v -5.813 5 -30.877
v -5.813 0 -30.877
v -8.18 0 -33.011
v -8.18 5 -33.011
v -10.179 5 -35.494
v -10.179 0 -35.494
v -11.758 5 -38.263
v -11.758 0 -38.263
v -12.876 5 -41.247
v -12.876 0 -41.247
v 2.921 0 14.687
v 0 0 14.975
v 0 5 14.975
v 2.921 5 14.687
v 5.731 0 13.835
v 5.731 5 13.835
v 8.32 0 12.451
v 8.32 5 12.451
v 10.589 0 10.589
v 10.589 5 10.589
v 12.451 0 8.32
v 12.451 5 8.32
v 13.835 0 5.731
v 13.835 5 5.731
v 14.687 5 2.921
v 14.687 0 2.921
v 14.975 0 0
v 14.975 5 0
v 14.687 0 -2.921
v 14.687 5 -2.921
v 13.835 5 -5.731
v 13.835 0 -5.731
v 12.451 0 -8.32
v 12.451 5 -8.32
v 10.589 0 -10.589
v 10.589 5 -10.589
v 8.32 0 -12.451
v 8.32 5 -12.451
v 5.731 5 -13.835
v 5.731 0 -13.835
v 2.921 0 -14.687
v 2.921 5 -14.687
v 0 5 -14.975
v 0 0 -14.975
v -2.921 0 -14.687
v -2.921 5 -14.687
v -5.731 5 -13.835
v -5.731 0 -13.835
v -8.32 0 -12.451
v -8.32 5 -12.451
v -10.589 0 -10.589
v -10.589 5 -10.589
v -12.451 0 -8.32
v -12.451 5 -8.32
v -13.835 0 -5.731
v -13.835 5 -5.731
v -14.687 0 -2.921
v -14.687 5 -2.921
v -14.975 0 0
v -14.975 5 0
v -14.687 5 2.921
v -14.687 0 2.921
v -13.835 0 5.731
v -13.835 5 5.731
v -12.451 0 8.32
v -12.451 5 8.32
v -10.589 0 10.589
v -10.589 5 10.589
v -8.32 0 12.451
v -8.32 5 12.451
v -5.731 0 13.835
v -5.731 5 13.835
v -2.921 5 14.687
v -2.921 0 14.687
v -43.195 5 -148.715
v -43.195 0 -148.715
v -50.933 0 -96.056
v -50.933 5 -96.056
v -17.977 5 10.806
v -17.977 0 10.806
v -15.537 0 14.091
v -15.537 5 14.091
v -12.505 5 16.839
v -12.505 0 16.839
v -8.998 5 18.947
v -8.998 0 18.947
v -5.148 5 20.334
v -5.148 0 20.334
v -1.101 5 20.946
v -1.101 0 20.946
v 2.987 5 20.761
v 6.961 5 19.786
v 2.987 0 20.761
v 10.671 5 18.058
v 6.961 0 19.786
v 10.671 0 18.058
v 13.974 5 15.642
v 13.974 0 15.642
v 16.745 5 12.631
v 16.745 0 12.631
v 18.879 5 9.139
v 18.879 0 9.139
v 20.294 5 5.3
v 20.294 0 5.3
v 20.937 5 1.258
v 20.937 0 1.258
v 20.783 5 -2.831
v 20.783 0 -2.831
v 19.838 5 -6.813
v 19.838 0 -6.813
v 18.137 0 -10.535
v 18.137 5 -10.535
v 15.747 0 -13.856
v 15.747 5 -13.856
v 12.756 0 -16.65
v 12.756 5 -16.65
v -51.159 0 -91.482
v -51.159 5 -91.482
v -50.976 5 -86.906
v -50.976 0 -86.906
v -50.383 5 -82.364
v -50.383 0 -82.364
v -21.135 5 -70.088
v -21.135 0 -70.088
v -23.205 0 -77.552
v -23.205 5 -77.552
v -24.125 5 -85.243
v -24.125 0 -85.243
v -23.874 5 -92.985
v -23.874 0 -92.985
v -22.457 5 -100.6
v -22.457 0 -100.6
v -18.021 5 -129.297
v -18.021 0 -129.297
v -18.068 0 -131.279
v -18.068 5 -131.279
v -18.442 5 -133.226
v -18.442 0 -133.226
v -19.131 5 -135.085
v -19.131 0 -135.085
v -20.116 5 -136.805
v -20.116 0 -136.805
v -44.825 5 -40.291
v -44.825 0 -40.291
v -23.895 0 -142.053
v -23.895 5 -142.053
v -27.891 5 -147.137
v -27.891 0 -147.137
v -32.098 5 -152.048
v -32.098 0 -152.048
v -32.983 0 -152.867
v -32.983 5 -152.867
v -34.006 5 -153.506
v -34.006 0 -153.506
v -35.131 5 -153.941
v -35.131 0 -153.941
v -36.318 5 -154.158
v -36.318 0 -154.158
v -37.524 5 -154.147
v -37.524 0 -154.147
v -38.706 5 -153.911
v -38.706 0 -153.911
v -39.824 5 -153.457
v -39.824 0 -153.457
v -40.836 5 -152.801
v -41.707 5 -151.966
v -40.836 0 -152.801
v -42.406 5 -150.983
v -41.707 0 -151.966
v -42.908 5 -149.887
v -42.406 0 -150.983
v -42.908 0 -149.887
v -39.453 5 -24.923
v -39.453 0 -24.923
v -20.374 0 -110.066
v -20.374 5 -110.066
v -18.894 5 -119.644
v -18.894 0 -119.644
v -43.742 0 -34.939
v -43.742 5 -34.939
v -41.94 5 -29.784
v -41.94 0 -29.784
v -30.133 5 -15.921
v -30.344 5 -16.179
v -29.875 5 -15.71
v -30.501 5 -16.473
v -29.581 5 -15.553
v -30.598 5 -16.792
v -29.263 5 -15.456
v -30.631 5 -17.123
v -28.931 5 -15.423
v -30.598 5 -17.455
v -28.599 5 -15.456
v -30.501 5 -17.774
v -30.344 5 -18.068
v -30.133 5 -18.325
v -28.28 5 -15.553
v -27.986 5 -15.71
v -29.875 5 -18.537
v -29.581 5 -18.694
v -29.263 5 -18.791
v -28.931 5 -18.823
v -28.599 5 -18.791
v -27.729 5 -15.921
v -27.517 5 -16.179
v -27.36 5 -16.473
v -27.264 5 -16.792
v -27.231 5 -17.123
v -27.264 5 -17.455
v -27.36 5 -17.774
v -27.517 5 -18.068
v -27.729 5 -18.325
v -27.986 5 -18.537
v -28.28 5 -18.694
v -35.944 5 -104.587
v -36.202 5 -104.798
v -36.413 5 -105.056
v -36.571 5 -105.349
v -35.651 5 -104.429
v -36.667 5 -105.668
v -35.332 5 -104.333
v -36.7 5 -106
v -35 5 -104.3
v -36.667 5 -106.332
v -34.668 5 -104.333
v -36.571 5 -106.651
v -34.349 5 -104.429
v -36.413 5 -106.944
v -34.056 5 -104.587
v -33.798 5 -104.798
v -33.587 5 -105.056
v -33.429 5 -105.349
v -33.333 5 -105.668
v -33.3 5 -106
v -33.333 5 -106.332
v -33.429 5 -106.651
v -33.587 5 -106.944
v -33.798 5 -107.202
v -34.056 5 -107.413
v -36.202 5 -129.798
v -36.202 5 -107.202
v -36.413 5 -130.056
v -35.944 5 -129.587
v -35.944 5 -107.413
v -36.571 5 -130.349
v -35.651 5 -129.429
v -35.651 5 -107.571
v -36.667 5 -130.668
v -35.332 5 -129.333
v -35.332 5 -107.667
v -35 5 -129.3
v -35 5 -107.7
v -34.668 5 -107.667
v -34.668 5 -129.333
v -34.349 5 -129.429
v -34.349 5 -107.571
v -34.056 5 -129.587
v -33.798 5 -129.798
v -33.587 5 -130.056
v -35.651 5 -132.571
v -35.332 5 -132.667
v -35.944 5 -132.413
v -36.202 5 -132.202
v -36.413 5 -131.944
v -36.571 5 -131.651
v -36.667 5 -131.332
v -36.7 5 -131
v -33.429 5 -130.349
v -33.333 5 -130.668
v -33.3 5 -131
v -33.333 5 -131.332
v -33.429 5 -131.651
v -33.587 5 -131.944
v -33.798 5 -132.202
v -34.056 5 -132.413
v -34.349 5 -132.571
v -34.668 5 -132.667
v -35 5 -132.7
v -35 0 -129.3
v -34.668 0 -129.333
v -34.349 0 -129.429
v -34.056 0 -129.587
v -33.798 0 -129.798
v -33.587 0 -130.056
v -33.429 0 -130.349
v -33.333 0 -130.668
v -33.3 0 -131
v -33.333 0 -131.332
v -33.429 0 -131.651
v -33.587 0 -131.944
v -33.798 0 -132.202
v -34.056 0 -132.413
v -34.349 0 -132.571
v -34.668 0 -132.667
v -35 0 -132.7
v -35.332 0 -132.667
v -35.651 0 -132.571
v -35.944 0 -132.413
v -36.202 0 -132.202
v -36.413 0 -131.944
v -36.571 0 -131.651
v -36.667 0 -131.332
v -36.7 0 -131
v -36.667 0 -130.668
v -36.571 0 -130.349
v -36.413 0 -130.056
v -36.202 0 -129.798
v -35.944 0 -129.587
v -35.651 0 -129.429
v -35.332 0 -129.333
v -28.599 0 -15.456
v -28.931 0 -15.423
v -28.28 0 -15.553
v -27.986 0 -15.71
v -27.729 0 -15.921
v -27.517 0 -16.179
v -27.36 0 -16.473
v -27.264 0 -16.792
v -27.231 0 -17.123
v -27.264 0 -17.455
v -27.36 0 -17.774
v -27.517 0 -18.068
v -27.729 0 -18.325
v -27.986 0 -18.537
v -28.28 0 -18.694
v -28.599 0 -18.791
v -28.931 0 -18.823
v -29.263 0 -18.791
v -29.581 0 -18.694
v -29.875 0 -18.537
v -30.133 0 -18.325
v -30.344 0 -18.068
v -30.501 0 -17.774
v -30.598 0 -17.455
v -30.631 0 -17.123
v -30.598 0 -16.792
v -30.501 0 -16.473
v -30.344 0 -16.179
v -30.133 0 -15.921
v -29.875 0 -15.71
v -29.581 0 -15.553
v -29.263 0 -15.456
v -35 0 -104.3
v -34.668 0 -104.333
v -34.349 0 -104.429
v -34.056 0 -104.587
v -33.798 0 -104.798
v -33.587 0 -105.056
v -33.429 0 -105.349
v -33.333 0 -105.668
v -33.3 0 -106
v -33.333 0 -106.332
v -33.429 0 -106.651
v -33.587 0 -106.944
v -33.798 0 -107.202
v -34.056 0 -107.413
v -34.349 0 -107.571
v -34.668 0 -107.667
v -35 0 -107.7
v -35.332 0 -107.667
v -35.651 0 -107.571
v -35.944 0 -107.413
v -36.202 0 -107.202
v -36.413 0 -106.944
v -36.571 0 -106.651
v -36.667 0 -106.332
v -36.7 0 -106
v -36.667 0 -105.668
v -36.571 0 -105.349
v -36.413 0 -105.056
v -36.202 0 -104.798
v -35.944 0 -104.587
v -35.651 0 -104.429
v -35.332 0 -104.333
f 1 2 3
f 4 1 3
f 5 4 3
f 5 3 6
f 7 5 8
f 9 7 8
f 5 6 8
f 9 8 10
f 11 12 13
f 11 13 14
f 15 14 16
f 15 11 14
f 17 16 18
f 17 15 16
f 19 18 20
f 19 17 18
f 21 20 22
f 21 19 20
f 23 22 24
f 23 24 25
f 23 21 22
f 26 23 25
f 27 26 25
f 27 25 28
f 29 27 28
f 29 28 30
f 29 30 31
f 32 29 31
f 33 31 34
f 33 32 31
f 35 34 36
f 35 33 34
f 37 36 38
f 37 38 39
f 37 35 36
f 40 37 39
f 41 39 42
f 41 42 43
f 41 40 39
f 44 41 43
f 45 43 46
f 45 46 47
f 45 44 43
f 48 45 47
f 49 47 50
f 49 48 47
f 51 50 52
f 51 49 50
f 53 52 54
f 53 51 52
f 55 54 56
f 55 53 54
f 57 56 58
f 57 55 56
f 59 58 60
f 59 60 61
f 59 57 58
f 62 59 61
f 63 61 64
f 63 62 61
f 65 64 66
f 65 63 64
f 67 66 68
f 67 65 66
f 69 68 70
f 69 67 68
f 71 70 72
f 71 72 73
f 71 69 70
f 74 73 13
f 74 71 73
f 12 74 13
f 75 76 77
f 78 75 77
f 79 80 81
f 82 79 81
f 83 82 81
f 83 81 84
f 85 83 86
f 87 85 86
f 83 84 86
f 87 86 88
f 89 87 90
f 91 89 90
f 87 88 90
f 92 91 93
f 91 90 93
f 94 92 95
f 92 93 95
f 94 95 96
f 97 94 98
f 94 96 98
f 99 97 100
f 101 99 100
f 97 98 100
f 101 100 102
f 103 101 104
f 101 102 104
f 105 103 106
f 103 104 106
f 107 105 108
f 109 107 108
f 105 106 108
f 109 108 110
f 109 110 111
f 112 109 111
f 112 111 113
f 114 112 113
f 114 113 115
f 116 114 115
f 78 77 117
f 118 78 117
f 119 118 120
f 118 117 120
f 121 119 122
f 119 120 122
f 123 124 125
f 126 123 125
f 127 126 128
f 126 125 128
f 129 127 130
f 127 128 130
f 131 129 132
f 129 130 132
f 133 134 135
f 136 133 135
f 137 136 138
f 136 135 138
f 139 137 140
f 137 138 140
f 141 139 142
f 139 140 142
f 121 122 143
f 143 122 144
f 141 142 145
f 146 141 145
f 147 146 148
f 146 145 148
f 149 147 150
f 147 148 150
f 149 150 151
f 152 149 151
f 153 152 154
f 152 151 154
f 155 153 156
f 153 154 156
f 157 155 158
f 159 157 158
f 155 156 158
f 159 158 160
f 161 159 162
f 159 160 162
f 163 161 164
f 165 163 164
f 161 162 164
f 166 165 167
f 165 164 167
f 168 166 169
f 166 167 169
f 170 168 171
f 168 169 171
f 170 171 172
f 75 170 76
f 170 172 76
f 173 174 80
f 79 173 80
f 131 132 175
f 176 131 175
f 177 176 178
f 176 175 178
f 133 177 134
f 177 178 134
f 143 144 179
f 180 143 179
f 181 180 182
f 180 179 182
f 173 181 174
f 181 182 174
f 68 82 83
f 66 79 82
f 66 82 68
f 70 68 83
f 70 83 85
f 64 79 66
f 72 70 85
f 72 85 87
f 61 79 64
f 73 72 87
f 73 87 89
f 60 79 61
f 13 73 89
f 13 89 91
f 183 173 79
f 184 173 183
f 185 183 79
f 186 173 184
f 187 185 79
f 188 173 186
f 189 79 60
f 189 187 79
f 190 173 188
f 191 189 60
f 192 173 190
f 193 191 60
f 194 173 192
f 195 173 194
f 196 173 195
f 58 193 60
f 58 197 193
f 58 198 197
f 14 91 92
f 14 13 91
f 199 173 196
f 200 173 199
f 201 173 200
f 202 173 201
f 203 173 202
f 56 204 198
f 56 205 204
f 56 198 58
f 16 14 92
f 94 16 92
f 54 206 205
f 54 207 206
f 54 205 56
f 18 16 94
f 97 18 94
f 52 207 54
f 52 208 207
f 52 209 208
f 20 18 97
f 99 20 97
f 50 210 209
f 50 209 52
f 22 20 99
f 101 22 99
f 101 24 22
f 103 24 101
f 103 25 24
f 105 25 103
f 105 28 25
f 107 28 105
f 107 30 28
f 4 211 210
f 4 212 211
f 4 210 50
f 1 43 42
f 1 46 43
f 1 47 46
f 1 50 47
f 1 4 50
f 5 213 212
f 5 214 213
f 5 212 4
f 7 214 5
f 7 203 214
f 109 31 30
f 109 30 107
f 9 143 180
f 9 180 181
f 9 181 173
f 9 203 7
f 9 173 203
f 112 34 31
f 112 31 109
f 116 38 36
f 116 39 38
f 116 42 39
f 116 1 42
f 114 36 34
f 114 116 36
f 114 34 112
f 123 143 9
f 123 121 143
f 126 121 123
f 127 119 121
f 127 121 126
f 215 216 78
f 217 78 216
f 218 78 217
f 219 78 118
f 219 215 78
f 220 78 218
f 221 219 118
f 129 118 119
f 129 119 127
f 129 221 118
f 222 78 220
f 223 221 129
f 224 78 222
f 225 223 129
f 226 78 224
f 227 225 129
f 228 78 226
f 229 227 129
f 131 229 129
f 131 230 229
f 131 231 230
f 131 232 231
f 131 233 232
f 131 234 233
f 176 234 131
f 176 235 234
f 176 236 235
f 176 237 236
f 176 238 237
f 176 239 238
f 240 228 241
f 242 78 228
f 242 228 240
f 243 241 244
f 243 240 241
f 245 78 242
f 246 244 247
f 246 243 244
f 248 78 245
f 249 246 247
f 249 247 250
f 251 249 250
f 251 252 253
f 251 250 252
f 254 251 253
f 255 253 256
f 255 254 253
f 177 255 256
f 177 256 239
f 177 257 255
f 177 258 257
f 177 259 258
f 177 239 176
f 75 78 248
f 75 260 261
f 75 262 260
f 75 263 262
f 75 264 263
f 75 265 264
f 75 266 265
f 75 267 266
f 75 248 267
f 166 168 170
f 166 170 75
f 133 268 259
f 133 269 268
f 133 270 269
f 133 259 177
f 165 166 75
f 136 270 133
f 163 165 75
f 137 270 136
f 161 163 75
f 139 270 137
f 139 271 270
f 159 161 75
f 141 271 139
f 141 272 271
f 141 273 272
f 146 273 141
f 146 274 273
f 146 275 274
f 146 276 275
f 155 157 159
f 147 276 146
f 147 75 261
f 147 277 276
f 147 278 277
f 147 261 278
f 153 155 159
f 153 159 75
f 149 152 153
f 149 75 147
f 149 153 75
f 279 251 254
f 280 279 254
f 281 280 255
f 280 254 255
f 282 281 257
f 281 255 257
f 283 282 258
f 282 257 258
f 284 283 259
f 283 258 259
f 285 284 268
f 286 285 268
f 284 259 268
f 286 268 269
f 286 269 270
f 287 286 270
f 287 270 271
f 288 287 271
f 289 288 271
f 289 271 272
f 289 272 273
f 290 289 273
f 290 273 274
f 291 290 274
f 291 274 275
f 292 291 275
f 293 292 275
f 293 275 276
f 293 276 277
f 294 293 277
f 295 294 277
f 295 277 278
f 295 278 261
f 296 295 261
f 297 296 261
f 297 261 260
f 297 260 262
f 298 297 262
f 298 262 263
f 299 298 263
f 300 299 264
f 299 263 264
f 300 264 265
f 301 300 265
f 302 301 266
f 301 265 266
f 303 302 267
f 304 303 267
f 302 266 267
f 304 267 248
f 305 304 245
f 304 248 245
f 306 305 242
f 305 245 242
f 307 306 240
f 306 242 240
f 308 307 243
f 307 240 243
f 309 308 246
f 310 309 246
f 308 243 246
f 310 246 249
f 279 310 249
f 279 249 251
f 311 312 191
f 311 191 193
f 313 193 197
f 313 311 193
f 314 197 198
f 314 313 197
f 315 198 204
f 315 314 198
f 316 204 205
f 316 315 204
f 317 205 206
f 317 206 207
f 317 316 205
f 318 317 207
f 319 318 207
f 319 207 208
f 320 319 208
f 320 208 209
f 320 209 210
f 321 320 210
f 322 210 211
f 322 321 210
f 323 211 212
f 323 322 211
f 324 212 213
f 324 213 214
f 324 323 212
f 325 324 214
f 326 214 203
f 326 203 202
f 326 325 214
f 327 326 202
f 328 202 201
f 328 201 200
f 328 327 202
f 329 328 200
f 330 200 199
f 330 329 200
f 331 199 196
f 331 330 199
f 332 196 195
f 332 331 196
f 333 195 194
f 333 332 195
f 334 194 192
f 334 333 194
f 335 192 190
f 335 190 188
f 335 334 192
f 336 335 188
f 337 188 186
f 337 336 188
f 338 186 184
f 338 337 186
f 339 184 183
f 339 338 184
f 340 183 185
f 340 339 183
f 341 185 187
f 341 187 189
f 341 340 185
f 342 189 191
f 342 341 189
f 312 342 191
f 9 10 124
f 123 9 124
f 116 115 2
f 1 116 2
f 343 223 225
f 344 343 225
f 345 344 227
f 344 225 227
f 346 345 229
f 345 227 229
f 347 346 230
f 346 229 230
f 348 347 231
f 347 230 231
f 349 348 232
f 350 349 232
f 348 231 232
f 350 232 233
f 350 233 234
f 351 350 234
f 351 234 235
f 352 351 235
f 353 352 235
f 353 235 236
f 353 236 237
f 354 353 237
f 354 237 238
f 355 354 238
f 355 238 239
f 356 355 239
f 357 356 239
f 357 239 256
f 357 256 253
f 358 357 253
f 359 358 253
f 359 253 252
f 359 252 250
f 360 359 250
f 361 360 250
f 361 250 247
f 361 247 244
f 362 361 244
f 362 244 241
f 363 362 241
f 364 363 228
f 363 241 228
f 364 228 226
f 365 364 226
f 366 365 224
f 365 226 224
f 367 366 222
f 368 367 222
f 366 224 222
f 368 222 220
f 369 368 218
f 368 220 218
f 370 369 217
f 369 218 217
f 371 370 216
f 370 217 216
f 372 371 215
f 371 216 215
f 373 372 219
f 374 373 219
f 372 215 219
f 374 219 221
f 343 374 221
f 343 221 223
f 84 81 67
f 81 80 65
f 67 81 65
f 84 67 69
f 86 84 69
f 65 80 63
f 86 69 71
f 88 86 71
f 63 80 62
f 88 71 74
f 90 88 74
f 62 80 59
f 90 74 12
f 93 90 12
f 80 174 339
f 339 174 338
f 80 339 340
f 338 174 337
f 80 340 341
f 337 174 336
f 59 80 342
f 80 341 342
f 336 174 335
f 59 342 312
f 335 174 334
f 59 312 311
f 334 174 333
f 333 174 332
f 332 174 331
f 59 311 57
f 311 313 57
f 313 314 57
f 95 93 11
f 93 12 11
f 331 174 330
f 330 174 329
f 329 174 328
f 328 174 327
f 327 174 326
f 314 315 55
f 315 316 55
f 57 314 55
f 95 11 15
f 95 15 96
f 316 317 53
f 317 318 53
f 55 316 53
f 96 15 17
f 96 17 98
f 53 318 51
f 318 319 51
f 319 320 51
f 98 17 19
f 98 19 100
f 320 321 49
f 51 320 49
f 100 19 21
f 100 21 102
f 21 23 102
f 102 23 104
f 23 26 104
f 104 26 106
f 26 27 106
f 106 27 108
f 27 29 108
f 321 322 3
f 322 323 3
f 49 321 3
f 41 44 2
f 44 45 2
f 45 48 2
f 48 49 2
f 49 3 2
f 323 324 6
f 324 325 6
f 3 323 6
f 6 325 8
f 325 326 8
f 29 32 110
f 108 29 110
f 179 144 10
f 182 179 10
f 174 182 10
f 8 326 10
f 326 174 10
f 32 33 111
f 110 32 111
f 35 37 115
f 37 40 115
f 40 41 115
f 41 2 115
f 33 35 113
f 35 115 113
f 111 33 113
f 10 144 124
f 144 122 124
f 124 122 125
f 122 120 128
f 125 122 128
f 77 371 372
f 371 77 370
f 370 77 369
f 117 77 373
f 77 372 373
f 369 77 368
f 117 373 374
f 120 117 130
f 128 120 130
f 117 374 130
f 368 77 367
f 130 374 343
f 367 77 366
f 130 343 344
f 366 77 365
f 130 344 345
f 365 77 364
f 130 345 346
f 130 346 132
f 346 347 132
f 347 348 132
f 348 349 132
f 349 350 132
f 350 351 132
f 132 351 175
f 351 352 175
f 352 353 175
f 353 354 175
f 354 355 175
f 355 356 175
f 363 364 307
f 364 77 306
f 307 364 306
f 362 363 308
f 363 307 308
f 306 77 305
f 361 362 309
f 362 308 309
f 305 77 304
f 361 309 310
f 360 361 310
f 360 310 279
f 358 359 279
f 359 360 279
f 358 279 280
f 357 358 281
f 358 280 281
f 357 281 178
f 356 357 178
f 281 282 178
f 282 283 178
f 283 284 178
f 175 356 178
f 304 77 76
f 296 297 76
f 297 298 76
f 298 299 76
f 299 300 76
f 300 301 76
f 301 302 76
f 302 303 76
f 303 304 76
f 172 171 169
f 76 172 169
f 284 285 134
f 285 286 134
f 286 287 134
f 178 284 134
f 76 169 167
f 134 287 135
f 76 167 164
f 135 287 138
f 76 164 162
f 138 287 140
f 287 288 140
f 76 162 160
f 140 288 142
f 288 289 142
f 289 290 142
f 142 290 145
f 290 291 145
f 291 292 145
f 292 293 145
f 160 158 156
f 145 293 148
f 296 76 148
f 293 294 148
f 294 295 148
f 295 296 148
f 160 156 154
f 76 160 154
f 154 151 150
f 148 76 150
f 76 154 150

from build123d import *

# Parameters (mm, degrees)
SKETCH1_R           = 14.975
SKETCH1_R_2         = 1.7
BOSS_EXTRUDE2_DEPTH = 5
CUT_EXTRUDE1_REACH  = 164.524
SKETCH3_R           = 1.7


with BuildPart() as part:
    # Sketch1 → Boss-Extrude2 (new body)
    with BuildSketch(Plane(origin=(0, 0, 0), x_dir=(1, 0, 0), z_dir=(0, 1, 0))):
        with BuildLine():
            Line((12.756485957, 16.650005737), (-5.812603326, 30.876807241))
            ThreePointArc((-5.812603326, 30.876807241), (-10.178871966, 35.493803021), (-12.876419651, 41.247426954))
            Line((-12.876419651, 41.247426954), (-21.13456265, 70.088423369))
            ThreePointArc((-21.13456265, 70.088423369), (-24.125041887, 85.243134658), (-22.456551163, 100.599709115))
            ThreePointArc((-22.456551163, 100.599709115), (-19.558480324, 114.843106453), (-18.020623668, 129.29676271))
            ThreePointArc((-18.020623668, 129.29676271), (-18.441772746, 133.226047543), (-20.116399197, 136.805470974))
            ThreePointArc((-20.116399197, 136.805470974), (-25.866377757, 144.615905974), (-32.098124488, 152.047627243))
            ThreePointArc((-32.098124488, 152.047627243), (-38.706331156, 153.910886754), (-43.194615771, 148.715173848))
            Line((-43.194615771, 148.715173848), (-50.932711484, 96.056215067))
            ThreePointArc((-50.932711484, 96.056215067), (-51.118515181, 89.191813761), (-50.383474997, 82.364351257))
            Line((-50.383474997, 82.364351257), (-44.824720745, 40.290812443))
            ThreePointArc((-44.824720745, 40.290812443), (-42.928869469, 32.33094735), (-39.452930017, 24.92341407))
            Line((-39.452930017, 24.92341407), (-17.977463078, -10.80562105))
            ThreePointArc((-17.977463078, -10.80562105), (13.973815194, -15.642350012), (12.756485957, 16.650005737))
        make_face()
        with Locations(Location((0, 0, 0), (0, 0, 270))):
            Circle(SKETCH1_R, mode=Mode.SUBTRACT)
        with Locations(Location((-28.930848813, 17.123276905, 0), (0, 0, 270))):
            Circle(SKETCH1_R_2, mode=Mode.SUBTRACT)
    extrude(amount=BOSS_EXTRUDE2_DEPTH)

    # Sketch3 → Cut-Extrude1 (cut, up to next)
    with BuildSketch(Plane(origin=(0, 5, 0), x_dir=(1, 0, 0), z_dir=(0, 1, 0)), mode=Mode.PRIVATE) as cut_extrude1_sk1:
        with Locations(Location((-35, 131, 0), (0, 0, 270))):
            Circle(SKETCH3_R)
    cut_extrude1_tool1 = extrude(cut_extrude1_sk1.sketch, amount=-CUT_EXTRUDE1_REACH, mode=Mode.PRIVATE) & part.part
    # Sketch3 → Cut-Extrude1 (cut, up to next)
    with BuildSketch(Plane(origin=(0, 5, 0), x_dir=(1, 0, 0), z_dir=(0, 1, 0)), mode=Mode.PRIVATE) as cut_extrude1_sk2:
        with Locations(Location((-35, 106, 0), (0, 0, 270))):
            Circle(SKETCH3_R)
    cut_extrude1_tool2 = extrude(cut_extrude1_sk2.sketch, amount=-CUT_EXTRUDE1_REACH, mode=Mode.PRIVATE) & part.part
    add(cut_extrude1_tool1.solids().sort_by_distance((-35, 5, -131))[0], mode=Mode.SUBTRACT)
    add(cut_extrude1_tool2.solids().sort_by_distance((-35, 5, -106))[0], mode=Mode.SUBTRACT)


solid = part.part
